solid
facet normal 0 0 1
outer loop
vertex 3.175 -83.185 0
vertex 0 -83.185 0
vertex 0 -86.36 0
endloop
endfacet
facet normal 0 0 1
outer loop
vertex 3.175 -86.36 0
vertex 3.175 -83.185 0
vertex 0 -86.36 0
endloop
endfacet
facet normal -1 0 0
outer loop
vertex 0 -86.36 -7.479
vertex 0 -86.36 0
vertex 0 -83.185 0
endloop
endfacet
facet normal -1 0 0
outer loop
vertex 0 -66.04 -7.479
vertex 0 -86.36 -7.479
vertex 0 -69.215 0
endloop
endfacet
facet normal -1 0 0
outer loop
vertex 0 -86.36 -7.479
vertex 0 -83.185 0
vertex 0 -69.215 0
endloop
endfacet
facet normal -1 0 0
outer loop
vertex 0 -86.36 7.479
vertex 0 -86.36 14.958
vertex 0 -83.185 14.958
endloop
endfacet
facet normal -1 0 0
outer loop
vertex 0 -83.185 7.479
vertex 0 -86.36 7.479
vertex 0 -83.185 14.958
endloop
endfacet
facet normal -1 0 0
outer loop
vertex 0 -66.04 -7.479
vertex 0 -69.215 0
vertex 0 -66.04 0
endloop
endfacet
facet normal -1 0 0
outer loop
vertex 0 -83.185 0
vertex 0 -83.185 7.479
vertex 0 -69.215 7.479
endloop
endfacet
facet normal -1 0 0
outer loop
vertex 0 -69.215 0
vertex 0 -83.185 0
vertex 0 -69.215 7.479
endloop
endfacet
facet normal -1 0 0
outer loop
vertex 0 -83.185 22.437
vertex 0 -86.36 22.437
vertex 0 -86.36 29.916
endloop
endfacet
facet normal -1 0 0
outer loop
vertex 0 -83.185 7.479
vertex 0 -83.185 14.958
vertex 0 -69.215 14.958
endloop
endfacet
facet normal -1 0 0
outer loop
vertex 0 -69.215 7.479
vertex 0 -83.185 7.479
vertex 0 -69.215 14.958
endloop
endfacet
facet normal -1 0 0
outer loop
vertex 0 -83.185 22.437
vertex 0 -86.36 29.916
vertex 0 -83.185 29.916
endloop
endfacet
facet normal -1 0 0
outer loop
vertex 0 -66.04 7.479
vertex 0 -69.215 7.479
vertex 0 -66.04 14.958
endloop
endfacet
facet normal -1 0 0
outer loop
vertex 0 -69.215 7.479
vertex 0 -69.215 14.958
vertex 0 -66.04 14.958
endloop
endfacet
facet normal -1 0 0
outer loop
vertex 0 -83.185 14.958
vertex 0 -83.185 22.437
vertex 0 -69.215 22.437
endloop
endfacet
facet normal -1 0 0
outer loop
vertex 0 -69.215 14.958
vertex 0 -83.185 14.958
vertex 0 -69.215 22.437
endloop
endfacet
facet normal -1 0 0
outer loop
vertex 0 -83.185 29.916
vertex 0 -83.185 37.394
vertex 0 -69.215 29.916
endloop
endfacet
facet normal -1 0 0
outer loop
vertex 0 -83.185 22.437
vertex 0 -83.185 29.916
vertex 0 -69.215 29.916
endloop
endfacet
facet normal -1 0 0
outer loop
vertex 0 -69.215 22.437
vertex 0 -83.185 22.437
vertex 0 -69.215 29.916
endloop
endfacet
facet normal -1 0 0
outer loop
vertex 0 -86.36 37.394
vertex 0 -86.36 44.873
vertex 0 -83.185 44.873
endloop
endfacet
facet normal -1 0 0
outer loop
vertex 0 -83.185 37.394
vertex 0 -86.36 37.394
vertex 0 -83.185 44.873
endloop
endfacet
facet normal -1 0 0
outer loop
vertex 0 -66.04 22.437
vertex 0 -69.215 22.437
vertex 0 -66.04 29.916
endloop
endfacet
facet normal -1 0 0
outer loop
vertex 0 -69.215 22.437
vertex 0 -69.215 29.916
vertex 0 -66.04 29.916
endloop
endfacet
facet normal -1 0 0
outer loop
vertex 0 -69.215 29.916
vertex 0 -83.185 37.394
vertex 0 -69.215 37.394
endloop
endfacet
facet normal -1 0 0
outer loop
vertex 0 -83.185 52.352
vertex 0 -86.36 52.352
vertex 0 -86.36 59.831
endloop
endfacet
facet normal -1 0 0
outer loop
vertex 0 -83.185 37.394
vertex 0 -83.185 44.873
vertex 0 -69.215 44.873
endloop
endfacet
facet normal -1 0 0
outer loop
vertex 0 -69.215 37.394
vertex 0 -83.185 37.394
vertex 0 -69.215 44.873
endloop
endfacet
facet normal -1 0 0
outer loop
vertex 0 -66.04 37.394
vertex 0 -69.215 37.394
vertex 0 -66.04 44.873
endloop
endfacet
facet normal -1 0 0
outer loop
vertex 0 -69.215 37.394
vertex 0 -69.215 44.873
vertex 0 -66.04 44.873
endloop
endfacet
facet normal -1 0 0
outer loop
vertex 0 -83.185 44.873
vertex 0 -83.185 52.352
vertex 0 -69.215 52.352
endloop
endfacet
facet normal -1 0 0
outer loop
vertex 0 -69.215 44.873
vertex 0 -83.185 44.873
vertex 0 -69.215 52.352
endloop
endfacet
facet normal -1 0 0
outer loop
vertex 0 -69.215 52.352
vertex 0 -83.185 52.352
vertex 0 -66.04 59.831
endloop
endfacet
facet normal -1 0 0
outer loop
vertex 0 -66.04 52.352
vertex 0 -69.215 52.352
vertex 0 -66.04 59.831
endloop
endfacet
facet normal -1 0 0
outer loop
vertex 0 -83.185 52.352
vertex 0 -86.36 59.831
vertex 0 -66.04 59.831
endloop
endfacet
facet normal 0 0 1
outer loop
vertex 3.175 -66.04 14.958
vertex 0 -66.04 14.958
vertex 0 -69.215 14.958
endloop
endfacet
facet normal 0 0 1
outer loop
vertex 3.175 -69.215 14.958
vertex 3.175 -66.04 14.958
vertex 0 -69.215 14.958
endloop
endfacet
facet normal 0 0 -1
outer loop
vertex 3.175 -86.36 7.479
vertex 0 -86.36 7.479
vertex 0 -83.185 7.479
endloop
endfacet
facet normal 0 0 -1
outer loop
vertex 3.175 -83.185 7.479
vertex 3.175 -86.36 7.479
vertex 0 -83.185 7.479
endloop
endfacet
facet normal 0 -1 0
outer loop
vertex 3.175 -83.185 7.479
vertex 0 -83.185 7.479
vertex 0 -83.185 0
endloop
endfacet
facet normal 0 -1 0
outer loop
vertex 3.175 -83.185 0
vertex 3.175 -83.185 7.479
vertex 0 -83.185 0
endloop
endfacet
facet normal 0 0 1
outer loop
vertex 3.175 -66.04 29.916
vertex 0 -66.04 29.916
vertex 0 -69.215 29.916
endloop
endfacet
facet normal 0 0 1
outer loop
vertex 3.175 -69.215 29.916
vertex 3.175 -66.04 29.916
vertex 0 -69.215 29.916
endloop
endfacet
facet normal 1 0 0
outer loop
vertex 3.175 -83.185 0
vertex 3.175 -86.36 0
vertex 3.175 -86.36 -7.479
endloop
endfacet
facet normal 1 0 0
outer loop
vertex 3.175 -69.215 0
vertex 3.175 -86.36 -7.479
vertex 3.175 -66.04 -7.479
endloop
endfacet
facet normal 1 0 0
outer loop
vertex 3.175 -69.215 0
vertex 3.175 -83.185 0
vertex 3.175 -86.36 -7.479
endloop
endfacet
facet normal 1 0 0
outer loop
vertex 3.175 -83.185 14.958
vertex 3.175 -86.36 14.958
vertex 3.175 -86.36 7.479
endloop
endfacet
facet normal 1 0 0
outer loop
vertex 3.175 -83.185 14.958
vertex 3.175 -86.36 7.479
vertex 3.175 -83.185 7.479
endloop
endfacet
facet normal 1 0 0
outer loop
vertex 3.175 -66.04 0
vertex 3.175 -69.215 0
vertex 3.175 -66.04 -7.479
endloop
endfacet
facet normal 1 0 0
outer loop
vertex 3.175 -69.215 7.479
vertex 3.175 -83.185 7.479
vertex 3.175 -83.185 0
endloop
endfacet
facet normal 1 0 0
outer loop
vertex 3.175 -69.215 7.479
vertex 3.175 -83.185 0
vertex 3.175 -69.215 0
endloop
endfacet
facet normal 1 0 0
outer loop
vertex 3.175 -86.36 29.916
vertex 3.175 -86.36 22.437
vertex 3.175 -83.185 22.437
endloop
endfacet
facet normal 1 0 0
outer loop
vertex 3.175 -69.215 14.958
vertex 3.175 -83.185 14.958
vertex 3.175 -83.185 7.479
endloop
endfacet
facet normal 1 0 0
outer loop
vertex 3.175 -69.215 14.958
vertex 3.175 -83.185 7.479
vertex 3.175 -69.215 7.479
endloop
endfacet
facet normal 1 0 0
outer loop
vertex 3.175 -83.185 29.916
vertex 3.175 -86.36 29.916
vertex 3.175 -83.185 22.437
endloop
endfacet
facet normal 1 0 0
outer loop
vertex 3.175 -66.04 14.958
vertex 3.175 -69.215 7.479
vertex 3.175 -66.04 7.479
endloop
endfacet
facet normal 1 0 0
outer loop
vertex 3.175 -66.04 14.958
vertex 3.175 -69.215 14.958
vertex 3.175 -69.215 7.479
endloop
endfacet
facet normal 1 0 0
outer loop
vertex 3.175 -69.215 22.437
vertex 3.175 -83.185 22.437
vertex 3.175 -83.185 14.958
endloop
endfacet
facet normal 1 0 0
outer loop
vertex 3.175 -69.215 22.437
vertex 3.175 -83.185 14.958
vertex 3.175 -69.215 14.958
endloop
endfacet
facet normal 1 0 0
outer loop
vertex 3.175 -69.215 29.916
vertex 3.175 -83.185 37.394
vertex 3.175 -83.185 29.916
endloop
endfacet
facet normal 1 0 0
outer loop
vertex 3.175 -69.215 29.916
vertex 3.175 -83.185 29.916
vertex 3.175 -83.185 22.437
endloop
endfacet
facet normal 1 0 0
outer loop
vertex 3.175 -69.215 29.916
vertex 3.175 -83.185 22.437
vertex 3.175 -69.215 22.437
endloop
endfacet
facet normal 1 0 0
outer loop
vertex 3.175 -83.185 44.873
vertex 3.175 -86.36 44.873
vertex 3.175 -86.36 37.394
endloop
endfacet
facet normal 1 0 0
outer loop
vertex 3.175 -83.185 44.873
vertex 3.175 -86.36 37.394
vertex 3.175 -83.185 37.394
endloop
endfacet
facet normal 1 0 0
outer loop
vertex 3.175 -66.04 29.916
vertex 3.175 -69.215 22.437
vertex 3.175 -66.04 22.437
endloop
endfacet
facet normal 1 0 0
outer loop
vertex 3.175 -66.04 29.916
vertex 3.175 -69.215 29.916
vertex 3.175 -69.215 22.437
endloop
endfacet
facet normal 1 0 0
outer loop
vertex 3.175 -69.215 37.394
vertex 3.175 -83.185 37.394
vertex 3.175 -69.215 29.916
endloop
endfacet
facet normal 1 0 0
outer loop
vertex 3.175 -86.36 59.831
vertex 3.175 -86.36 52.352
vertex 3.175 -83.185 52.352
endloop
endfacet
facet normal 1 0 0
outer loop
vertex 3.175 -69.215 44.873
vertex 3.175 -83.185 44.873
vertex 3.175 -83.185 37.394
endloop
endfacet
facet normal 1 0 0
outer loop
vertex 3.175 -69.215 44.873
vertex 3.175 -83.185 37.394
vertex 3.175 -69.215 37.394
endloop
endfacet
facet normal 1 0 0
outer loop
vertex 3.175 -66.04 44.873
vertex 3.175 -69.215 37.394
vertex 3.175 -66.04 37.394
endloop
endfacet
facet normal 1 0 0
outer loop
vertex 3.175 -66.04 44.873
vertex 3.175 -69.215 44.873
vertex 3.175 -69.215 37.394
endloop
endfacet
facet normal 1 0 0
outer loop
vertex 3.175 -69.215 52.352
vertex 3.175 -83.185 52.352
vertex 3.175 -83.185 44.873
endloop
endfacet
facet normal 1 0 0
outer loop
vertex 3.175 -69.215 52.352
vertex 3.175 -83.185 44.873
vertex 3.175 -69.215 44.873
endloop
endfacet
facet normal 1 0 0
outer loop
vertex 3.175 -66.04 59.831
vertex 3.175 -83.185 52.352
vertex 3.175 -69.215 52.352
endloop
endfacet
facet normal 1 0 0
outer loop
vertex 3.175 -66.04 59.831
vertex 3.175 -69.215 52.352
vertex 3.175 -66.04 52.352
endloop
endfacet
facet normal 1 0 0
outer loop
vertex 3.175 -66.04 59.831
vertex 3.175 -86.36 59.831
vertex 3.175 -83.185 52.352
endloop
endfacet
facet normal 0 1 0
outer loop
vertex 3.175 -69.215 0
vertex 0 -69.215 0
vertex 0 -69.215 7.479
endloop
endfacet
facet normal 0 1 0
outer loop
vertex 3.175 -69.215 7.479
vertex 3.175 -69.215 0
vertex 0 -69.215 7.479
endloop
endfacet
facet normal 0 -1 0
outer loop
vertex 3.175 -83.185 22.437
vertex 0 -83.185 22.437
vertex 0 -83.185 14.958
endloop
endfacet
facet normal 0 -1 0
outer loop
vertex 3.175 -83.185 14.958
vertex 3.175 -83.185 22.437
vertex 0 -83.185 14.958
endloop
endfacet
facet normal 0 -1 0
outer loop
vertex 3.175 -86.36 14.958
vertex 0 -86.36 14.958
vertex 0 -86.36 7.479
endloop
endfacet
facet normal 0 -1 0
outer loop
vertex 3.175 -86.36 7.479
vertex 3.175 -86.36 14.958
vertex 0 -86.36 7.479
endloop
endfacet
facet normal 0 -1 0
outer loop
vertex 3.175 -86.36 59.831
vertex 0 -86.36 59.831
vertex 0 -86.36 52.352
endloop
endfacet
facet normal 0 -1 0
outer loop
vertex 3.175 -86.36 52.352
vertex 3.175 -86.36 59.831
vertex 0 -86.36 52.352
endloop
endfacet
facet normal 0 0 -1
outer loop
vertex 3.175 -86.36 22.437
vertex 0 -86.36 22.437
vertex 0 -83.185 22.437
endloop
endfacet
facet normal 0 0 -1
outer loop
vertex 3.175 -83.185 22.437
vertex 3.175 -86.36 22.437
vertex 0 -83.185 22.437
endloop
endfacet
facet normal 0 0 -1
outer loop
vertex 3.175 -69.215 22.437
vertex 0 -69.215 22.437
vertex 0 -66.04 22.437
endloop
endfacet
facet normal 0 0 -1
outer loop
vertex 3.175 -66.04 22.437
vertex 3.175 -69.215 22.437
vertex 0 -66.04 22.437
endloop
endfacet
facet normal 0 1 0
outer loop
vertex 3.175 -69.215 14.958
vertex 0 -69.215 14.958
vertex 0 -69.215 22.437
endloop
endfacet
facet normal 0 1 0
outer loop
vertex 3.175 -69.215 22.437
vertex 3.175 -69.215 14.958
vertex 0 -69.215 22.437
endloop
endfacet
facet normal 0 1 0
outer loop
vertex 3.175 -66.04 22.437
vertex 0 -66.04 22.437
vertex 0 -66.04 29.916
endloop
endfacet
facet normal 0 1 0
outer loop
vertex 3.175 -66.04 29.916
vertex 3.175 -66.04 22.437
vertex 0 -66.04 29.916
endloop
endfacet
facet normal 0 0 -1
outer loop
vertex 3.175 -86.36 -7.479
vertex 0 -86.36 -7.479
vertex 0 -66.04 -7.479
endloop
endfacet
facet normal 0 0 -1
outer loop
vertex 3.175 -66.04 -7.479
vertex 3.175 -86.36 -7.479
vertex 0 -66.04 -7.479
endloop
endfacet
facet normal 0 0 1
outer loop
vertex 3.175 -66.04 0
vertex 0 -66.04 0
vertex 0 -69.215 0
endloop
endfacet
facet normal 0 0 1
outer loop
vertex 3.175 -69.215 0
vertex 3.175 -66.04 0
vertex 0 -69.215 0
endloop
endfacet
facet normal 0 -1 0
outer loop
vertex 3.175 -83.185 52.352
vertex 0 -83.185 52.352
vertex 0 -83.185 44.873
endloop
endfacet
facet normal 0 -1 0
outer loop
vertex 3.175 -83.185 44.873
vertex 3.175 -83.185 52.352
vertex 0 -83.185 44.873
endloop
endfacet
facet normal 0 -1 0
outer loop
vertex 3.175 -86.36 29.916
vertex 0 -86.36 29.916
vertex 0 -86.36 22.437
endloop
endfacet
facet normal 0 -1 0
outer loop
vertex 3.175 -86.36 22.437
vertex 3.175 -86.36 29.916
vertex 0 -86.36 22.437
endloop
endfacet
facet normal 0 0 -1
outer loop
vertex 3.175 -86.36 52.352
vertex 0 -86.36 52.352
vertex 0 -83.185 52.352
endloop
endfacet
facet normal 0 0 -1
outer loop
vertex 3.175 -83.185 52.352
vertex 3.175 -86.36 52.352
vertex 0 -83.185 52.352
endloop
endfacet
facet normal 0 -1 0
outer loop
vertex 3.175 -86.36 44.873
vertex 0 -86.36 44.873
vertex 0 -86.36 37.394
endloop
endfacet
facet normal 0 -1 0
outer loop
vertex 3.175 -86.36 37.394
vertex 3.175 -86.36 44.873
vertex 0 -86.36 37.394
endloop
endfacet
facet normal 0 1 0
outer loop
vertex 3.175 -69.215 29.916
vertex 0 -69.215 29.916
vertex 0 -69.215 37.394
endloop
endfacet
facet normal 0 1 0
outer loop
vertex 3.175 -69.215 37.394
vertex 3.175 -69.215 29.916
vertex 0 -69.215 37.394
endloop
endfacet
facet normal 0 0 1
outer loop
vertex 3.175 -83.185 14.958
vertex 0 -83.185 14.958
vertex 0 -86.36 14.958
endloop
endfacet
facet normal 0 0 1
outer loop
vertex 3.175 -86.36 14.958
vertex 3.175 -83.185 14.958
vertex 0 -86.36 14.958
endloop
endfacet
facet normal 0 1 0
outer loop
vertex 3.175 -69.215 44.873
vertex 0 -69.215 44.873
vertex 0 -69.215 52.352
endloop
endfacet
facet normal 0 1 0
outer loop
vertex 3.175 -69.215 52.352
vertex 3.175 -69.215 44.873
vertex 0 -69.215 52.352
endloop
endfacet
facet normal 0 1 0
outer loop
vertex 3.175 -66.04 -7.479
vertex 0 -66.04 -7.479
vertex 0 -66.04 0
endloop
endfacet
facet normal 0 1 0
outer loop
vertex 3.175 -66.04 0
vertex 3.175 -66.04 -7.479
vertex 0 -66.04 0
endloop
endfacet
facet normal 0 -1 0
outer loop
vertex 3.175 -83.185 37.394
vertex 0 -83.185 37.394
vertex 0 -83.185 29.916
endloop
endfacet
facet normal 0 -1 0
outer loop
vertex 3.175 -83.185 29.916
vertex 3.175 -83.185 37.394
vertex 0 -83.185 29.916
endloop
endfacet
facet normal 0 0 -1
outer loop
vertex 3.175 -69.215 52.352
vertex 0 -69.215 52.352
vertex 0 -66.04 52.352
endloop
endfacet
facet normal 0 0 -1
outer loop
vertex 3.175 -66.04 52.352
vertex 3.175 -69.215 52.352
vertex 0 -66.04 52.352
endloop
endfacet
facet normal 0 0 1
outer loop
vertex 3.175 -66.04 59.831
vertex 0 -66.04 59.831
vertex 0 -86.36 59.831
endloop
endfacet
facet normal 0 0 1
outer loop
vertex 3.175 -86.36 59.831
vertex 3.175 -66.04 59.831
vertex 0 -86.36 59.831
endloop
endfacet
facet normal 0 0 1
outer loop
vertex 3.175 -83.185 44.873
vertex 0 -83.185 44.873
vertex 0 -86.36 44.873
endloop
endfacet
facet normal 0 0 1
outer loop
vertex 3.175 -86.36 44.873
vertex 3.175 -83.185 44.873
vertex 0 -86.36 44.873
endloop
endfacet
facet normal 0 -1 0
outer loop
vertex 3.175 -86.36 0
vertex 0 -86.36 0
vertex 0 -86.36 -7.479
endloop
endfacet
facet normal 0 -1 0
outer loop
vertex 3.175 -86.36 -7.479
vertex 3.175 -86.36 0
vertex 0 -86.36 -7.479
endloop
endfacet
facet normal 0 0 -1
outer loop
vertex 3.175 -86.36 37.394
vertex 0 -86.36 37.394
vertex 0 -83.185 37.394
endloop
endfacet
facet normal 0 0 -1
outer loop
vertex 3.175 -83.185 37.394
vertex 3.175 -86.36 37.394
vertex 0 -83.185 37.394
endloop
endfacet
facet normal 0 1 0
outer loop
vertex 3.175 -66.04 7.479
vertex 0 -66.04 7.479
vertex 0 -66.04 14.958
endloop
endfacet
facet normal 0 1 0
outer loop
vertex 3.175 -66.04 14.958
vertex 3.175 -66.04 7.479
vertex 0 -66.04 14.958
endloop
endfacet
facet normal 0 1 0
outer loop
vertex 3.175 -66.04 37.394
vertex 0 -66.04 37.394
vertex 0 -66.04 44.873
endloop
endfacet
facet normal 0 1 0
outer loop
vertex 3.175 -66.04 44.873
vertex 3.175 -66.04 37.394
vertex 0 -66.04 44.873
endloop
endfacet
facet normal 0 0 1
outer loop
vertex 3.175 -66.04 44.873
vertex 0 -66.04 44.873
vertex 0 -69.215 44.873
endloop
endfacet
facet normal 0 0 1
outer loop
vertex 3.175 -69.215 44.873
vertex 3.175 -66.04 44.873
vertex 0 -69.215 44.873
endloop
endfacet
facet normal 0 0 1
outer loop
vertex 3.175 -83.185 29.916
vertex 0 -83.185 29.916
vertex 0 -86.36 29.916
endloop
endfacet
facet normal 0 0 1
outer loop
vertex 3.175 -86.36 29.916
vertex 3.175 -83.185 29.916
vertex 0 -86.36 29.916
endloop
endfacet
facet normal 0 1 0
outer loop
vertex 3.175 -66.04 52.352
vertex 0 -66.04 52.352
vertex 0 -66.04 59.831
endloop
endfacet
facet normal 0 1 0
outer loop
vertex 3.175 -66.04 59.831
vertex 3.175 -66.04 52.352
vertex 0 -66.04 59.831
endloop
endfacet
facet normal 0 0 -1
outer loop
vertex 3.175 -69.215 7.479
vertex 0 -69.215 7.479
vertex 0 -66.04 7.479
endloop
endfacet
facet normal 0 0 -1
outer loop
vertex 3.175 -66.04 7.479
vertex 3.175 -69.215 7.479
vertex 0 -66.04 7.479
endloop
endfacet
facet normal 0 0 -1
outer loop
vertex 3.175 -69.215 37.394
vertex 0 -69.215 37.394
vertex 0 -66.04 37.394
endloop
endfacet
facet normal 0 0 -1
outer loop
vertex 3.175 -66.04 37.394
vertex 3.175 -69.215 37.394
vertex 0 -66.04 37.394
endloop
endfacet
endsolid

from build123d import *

# Parameters (mm, degrees)
F1_DEPTH = 3.175


with BuildPart() as f1:
    # F0 (on Right) → F1 (new body)
    with BuildSketch(Plane.YZ):
        Polygon((-66.040002, 59.831111), (-86.360002, 59.831111), (-86.360002, 52.352222), (-83.185002, 52.352222), (-83.185002, 44.873333), (-86.360002, 44.873333), (-86.360002, 37.394444), (-83.185002, 37.394444), (-83.185002, 29.915556), (-86.360002, 29.915556), (-86.360002, 22.436667), (-83.185002, 22.436667), (-83.185002, 14.957778), (-86.360002, 14.957778), (-86.360002, 7.478889), (-83.185002, 7.478889), (-83.185002, 0), (-86.360002, 0), (-86.360002, -7.478889), (-66.040002, -7.478889), (-66.040002, 0), (-69.215002, 0), (-69.215002, 7.478889), (-66.040002, 7.478889), (-66.040002, 14.957778), (-69.215002, 14.957778), (-69.215002, 22.436667), (-66.040002, 22.436667), (-66.040002, 29.915556), (-69.215002, 29.915556), (-69.215002, 37.394444), (-66.040002, 37.394444), (-66.040002, 44.873333), (-69.215002, 44.873333), (-69.215002, 52.352222), (-66.040002, 52.352222), align=None)
    extrude(amount=F1_DEPTH)


solid = f1.part
